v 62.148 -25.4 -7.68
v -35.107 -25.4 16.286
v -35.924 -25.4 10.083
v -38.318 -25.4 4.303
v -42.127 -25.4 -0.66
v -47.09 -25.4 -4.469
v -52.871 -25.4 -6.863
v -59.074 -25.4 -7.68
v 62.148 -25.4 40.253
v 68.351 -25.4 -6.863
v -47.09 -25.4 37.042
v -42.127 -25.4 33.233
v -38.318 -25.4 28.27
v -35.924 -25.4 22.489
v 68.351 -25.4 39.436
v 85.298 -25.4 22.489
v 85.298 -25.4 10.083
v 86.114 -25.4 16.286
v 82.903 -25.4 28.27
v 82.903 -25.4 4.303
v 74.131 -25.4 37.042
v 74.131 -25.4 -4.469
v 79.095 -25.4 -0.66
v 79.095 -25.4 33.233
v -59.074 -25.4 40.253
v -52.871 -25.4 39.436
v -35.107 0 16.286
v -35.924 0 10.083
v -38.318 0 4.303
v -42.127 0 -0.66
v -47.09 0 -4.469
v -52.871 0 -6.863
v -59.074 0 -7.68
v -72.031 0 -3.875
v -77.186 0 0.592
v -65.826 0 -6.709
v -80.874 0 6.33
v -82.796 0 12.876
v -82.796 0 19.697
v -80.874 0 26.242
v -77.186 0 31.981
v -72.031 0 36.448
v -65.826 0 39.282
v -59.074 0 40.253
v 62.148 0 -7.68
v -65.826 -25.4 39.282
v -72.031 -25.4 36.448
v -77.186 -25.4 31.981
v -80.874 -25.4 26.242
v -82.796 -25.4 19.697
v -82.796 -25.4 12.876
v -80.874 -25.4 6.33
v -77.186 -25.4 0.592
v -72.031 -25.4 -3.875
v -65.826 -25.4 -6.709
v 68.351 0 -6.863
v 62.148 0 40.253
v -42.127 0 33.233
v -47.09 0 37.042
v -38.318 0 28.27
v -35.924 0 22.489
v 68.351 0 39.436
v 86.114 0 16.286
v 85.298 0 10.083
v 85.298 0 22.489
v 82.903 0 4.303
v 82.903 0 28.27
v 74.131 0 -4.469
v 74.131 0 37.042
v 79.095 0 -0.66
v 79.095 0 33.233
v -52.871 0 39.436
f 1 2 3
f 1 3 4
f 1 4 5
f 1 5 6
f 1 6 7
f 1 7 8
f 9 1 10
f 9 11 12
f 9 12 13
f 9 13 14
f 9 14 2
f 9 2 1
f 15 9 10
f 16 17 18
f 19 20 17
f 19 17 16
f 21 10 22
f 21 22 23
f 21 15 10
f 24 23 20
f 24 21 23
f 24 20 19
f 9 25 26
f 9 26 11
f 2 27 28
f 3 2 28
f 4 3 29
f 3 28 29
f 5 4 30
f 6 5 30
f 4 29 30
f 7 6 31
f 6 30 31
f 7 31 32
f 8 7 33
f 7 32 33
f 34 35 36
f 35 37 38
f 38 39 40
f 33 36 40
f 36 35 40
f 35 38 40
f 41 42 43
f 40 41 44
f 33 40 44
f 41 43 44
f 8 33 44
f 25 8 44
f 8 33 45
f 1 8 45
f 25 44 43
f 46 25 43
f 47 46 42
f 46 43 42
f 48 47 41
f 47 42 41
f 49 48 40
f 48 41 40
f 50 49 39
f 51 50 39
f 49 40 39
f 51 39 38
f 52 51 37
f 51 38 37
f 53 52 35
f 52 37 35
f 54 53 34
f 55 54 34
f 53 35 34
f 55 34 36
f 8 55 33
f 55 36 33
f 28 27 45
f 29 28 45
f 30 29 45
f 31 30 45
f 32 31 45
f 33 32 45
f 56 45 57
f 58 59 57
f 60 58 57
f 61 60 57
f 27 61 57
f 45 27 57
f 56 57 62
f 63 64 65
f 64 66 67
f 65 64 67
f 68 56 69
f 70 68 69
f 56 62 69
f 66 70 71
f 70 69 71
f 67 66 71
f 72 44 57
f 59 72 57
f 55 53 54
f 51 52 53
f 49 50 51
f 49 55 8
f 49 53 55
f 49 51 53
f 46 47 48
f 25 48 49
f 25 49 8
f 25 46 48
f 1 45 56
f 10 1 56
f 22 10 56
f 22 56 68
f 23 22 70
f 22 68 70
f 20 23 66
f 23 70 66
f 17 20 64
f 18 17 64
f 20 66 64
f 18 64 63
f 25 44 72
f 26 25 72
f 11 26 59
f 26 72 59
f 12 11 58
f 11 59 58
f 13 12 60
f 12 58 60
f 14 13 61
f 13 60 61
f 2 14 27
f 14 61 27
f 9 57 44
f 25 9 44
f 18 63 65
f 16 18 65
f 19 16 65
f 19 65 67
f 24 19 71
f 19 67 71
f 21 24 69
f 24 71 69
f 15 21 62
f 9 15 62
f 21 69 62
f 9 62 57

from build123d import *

# Parameters (mm, degrees)
F0_DEPTH = 25.4


with BuildPart() as f0:
    # F1 (on Front) → F0 (new body)
    with BuildSketch(Plane.XZ):
        with BuildLine():
            ThreePointArc((-35.107329, 16.286403), (-42.126887, -0.660307), (-59.073597, -7.679865))
            Line((-59.073597, -7.679865), (62.148049, -7.679865))
            ThreePointArc((62.148049, -7.679865), (38.181782, 16.286403), (62.148049, 40.252671))
            Line((62.148049, 40.252671), (-59.073597, 40.252671))
            ThreePointArc((-59.073597, 40.252671), (-42.126887, 33.233113), (-35.107329, 16.286403))
        make_face()
        with BuildLine():
            ThreePointArc((62.148049, 40.252671), (38.181782, 16.286403), (62.148049, -7.679865))
            Line((62.148049, -7.679865), (62.148049, 40.252671))
        make_face()
        with BuildLine():
            Line((62.148049, 40.252671), (62.148049, -7.679865))
            ThreePointArc((62.148049, -7.679865), (79.09476, -0.660307), (86.114317, 16.286403))
            ThreePointArc((86.114317, 16.286403), (79.09476, 33.233113), (62.148049, 40.252671))
        make_face()
        with BuildLine():
            ThreePointArc((-59.073597, 40.252671), (-83.039865, 16.286403), (-59.073597, -7.679865))
            Line((-59.073597, -7.679865), (-59.073597, 40.252671))
        make_face()
    extrude(amount=F0_DEPTH)


solid = f0.part
